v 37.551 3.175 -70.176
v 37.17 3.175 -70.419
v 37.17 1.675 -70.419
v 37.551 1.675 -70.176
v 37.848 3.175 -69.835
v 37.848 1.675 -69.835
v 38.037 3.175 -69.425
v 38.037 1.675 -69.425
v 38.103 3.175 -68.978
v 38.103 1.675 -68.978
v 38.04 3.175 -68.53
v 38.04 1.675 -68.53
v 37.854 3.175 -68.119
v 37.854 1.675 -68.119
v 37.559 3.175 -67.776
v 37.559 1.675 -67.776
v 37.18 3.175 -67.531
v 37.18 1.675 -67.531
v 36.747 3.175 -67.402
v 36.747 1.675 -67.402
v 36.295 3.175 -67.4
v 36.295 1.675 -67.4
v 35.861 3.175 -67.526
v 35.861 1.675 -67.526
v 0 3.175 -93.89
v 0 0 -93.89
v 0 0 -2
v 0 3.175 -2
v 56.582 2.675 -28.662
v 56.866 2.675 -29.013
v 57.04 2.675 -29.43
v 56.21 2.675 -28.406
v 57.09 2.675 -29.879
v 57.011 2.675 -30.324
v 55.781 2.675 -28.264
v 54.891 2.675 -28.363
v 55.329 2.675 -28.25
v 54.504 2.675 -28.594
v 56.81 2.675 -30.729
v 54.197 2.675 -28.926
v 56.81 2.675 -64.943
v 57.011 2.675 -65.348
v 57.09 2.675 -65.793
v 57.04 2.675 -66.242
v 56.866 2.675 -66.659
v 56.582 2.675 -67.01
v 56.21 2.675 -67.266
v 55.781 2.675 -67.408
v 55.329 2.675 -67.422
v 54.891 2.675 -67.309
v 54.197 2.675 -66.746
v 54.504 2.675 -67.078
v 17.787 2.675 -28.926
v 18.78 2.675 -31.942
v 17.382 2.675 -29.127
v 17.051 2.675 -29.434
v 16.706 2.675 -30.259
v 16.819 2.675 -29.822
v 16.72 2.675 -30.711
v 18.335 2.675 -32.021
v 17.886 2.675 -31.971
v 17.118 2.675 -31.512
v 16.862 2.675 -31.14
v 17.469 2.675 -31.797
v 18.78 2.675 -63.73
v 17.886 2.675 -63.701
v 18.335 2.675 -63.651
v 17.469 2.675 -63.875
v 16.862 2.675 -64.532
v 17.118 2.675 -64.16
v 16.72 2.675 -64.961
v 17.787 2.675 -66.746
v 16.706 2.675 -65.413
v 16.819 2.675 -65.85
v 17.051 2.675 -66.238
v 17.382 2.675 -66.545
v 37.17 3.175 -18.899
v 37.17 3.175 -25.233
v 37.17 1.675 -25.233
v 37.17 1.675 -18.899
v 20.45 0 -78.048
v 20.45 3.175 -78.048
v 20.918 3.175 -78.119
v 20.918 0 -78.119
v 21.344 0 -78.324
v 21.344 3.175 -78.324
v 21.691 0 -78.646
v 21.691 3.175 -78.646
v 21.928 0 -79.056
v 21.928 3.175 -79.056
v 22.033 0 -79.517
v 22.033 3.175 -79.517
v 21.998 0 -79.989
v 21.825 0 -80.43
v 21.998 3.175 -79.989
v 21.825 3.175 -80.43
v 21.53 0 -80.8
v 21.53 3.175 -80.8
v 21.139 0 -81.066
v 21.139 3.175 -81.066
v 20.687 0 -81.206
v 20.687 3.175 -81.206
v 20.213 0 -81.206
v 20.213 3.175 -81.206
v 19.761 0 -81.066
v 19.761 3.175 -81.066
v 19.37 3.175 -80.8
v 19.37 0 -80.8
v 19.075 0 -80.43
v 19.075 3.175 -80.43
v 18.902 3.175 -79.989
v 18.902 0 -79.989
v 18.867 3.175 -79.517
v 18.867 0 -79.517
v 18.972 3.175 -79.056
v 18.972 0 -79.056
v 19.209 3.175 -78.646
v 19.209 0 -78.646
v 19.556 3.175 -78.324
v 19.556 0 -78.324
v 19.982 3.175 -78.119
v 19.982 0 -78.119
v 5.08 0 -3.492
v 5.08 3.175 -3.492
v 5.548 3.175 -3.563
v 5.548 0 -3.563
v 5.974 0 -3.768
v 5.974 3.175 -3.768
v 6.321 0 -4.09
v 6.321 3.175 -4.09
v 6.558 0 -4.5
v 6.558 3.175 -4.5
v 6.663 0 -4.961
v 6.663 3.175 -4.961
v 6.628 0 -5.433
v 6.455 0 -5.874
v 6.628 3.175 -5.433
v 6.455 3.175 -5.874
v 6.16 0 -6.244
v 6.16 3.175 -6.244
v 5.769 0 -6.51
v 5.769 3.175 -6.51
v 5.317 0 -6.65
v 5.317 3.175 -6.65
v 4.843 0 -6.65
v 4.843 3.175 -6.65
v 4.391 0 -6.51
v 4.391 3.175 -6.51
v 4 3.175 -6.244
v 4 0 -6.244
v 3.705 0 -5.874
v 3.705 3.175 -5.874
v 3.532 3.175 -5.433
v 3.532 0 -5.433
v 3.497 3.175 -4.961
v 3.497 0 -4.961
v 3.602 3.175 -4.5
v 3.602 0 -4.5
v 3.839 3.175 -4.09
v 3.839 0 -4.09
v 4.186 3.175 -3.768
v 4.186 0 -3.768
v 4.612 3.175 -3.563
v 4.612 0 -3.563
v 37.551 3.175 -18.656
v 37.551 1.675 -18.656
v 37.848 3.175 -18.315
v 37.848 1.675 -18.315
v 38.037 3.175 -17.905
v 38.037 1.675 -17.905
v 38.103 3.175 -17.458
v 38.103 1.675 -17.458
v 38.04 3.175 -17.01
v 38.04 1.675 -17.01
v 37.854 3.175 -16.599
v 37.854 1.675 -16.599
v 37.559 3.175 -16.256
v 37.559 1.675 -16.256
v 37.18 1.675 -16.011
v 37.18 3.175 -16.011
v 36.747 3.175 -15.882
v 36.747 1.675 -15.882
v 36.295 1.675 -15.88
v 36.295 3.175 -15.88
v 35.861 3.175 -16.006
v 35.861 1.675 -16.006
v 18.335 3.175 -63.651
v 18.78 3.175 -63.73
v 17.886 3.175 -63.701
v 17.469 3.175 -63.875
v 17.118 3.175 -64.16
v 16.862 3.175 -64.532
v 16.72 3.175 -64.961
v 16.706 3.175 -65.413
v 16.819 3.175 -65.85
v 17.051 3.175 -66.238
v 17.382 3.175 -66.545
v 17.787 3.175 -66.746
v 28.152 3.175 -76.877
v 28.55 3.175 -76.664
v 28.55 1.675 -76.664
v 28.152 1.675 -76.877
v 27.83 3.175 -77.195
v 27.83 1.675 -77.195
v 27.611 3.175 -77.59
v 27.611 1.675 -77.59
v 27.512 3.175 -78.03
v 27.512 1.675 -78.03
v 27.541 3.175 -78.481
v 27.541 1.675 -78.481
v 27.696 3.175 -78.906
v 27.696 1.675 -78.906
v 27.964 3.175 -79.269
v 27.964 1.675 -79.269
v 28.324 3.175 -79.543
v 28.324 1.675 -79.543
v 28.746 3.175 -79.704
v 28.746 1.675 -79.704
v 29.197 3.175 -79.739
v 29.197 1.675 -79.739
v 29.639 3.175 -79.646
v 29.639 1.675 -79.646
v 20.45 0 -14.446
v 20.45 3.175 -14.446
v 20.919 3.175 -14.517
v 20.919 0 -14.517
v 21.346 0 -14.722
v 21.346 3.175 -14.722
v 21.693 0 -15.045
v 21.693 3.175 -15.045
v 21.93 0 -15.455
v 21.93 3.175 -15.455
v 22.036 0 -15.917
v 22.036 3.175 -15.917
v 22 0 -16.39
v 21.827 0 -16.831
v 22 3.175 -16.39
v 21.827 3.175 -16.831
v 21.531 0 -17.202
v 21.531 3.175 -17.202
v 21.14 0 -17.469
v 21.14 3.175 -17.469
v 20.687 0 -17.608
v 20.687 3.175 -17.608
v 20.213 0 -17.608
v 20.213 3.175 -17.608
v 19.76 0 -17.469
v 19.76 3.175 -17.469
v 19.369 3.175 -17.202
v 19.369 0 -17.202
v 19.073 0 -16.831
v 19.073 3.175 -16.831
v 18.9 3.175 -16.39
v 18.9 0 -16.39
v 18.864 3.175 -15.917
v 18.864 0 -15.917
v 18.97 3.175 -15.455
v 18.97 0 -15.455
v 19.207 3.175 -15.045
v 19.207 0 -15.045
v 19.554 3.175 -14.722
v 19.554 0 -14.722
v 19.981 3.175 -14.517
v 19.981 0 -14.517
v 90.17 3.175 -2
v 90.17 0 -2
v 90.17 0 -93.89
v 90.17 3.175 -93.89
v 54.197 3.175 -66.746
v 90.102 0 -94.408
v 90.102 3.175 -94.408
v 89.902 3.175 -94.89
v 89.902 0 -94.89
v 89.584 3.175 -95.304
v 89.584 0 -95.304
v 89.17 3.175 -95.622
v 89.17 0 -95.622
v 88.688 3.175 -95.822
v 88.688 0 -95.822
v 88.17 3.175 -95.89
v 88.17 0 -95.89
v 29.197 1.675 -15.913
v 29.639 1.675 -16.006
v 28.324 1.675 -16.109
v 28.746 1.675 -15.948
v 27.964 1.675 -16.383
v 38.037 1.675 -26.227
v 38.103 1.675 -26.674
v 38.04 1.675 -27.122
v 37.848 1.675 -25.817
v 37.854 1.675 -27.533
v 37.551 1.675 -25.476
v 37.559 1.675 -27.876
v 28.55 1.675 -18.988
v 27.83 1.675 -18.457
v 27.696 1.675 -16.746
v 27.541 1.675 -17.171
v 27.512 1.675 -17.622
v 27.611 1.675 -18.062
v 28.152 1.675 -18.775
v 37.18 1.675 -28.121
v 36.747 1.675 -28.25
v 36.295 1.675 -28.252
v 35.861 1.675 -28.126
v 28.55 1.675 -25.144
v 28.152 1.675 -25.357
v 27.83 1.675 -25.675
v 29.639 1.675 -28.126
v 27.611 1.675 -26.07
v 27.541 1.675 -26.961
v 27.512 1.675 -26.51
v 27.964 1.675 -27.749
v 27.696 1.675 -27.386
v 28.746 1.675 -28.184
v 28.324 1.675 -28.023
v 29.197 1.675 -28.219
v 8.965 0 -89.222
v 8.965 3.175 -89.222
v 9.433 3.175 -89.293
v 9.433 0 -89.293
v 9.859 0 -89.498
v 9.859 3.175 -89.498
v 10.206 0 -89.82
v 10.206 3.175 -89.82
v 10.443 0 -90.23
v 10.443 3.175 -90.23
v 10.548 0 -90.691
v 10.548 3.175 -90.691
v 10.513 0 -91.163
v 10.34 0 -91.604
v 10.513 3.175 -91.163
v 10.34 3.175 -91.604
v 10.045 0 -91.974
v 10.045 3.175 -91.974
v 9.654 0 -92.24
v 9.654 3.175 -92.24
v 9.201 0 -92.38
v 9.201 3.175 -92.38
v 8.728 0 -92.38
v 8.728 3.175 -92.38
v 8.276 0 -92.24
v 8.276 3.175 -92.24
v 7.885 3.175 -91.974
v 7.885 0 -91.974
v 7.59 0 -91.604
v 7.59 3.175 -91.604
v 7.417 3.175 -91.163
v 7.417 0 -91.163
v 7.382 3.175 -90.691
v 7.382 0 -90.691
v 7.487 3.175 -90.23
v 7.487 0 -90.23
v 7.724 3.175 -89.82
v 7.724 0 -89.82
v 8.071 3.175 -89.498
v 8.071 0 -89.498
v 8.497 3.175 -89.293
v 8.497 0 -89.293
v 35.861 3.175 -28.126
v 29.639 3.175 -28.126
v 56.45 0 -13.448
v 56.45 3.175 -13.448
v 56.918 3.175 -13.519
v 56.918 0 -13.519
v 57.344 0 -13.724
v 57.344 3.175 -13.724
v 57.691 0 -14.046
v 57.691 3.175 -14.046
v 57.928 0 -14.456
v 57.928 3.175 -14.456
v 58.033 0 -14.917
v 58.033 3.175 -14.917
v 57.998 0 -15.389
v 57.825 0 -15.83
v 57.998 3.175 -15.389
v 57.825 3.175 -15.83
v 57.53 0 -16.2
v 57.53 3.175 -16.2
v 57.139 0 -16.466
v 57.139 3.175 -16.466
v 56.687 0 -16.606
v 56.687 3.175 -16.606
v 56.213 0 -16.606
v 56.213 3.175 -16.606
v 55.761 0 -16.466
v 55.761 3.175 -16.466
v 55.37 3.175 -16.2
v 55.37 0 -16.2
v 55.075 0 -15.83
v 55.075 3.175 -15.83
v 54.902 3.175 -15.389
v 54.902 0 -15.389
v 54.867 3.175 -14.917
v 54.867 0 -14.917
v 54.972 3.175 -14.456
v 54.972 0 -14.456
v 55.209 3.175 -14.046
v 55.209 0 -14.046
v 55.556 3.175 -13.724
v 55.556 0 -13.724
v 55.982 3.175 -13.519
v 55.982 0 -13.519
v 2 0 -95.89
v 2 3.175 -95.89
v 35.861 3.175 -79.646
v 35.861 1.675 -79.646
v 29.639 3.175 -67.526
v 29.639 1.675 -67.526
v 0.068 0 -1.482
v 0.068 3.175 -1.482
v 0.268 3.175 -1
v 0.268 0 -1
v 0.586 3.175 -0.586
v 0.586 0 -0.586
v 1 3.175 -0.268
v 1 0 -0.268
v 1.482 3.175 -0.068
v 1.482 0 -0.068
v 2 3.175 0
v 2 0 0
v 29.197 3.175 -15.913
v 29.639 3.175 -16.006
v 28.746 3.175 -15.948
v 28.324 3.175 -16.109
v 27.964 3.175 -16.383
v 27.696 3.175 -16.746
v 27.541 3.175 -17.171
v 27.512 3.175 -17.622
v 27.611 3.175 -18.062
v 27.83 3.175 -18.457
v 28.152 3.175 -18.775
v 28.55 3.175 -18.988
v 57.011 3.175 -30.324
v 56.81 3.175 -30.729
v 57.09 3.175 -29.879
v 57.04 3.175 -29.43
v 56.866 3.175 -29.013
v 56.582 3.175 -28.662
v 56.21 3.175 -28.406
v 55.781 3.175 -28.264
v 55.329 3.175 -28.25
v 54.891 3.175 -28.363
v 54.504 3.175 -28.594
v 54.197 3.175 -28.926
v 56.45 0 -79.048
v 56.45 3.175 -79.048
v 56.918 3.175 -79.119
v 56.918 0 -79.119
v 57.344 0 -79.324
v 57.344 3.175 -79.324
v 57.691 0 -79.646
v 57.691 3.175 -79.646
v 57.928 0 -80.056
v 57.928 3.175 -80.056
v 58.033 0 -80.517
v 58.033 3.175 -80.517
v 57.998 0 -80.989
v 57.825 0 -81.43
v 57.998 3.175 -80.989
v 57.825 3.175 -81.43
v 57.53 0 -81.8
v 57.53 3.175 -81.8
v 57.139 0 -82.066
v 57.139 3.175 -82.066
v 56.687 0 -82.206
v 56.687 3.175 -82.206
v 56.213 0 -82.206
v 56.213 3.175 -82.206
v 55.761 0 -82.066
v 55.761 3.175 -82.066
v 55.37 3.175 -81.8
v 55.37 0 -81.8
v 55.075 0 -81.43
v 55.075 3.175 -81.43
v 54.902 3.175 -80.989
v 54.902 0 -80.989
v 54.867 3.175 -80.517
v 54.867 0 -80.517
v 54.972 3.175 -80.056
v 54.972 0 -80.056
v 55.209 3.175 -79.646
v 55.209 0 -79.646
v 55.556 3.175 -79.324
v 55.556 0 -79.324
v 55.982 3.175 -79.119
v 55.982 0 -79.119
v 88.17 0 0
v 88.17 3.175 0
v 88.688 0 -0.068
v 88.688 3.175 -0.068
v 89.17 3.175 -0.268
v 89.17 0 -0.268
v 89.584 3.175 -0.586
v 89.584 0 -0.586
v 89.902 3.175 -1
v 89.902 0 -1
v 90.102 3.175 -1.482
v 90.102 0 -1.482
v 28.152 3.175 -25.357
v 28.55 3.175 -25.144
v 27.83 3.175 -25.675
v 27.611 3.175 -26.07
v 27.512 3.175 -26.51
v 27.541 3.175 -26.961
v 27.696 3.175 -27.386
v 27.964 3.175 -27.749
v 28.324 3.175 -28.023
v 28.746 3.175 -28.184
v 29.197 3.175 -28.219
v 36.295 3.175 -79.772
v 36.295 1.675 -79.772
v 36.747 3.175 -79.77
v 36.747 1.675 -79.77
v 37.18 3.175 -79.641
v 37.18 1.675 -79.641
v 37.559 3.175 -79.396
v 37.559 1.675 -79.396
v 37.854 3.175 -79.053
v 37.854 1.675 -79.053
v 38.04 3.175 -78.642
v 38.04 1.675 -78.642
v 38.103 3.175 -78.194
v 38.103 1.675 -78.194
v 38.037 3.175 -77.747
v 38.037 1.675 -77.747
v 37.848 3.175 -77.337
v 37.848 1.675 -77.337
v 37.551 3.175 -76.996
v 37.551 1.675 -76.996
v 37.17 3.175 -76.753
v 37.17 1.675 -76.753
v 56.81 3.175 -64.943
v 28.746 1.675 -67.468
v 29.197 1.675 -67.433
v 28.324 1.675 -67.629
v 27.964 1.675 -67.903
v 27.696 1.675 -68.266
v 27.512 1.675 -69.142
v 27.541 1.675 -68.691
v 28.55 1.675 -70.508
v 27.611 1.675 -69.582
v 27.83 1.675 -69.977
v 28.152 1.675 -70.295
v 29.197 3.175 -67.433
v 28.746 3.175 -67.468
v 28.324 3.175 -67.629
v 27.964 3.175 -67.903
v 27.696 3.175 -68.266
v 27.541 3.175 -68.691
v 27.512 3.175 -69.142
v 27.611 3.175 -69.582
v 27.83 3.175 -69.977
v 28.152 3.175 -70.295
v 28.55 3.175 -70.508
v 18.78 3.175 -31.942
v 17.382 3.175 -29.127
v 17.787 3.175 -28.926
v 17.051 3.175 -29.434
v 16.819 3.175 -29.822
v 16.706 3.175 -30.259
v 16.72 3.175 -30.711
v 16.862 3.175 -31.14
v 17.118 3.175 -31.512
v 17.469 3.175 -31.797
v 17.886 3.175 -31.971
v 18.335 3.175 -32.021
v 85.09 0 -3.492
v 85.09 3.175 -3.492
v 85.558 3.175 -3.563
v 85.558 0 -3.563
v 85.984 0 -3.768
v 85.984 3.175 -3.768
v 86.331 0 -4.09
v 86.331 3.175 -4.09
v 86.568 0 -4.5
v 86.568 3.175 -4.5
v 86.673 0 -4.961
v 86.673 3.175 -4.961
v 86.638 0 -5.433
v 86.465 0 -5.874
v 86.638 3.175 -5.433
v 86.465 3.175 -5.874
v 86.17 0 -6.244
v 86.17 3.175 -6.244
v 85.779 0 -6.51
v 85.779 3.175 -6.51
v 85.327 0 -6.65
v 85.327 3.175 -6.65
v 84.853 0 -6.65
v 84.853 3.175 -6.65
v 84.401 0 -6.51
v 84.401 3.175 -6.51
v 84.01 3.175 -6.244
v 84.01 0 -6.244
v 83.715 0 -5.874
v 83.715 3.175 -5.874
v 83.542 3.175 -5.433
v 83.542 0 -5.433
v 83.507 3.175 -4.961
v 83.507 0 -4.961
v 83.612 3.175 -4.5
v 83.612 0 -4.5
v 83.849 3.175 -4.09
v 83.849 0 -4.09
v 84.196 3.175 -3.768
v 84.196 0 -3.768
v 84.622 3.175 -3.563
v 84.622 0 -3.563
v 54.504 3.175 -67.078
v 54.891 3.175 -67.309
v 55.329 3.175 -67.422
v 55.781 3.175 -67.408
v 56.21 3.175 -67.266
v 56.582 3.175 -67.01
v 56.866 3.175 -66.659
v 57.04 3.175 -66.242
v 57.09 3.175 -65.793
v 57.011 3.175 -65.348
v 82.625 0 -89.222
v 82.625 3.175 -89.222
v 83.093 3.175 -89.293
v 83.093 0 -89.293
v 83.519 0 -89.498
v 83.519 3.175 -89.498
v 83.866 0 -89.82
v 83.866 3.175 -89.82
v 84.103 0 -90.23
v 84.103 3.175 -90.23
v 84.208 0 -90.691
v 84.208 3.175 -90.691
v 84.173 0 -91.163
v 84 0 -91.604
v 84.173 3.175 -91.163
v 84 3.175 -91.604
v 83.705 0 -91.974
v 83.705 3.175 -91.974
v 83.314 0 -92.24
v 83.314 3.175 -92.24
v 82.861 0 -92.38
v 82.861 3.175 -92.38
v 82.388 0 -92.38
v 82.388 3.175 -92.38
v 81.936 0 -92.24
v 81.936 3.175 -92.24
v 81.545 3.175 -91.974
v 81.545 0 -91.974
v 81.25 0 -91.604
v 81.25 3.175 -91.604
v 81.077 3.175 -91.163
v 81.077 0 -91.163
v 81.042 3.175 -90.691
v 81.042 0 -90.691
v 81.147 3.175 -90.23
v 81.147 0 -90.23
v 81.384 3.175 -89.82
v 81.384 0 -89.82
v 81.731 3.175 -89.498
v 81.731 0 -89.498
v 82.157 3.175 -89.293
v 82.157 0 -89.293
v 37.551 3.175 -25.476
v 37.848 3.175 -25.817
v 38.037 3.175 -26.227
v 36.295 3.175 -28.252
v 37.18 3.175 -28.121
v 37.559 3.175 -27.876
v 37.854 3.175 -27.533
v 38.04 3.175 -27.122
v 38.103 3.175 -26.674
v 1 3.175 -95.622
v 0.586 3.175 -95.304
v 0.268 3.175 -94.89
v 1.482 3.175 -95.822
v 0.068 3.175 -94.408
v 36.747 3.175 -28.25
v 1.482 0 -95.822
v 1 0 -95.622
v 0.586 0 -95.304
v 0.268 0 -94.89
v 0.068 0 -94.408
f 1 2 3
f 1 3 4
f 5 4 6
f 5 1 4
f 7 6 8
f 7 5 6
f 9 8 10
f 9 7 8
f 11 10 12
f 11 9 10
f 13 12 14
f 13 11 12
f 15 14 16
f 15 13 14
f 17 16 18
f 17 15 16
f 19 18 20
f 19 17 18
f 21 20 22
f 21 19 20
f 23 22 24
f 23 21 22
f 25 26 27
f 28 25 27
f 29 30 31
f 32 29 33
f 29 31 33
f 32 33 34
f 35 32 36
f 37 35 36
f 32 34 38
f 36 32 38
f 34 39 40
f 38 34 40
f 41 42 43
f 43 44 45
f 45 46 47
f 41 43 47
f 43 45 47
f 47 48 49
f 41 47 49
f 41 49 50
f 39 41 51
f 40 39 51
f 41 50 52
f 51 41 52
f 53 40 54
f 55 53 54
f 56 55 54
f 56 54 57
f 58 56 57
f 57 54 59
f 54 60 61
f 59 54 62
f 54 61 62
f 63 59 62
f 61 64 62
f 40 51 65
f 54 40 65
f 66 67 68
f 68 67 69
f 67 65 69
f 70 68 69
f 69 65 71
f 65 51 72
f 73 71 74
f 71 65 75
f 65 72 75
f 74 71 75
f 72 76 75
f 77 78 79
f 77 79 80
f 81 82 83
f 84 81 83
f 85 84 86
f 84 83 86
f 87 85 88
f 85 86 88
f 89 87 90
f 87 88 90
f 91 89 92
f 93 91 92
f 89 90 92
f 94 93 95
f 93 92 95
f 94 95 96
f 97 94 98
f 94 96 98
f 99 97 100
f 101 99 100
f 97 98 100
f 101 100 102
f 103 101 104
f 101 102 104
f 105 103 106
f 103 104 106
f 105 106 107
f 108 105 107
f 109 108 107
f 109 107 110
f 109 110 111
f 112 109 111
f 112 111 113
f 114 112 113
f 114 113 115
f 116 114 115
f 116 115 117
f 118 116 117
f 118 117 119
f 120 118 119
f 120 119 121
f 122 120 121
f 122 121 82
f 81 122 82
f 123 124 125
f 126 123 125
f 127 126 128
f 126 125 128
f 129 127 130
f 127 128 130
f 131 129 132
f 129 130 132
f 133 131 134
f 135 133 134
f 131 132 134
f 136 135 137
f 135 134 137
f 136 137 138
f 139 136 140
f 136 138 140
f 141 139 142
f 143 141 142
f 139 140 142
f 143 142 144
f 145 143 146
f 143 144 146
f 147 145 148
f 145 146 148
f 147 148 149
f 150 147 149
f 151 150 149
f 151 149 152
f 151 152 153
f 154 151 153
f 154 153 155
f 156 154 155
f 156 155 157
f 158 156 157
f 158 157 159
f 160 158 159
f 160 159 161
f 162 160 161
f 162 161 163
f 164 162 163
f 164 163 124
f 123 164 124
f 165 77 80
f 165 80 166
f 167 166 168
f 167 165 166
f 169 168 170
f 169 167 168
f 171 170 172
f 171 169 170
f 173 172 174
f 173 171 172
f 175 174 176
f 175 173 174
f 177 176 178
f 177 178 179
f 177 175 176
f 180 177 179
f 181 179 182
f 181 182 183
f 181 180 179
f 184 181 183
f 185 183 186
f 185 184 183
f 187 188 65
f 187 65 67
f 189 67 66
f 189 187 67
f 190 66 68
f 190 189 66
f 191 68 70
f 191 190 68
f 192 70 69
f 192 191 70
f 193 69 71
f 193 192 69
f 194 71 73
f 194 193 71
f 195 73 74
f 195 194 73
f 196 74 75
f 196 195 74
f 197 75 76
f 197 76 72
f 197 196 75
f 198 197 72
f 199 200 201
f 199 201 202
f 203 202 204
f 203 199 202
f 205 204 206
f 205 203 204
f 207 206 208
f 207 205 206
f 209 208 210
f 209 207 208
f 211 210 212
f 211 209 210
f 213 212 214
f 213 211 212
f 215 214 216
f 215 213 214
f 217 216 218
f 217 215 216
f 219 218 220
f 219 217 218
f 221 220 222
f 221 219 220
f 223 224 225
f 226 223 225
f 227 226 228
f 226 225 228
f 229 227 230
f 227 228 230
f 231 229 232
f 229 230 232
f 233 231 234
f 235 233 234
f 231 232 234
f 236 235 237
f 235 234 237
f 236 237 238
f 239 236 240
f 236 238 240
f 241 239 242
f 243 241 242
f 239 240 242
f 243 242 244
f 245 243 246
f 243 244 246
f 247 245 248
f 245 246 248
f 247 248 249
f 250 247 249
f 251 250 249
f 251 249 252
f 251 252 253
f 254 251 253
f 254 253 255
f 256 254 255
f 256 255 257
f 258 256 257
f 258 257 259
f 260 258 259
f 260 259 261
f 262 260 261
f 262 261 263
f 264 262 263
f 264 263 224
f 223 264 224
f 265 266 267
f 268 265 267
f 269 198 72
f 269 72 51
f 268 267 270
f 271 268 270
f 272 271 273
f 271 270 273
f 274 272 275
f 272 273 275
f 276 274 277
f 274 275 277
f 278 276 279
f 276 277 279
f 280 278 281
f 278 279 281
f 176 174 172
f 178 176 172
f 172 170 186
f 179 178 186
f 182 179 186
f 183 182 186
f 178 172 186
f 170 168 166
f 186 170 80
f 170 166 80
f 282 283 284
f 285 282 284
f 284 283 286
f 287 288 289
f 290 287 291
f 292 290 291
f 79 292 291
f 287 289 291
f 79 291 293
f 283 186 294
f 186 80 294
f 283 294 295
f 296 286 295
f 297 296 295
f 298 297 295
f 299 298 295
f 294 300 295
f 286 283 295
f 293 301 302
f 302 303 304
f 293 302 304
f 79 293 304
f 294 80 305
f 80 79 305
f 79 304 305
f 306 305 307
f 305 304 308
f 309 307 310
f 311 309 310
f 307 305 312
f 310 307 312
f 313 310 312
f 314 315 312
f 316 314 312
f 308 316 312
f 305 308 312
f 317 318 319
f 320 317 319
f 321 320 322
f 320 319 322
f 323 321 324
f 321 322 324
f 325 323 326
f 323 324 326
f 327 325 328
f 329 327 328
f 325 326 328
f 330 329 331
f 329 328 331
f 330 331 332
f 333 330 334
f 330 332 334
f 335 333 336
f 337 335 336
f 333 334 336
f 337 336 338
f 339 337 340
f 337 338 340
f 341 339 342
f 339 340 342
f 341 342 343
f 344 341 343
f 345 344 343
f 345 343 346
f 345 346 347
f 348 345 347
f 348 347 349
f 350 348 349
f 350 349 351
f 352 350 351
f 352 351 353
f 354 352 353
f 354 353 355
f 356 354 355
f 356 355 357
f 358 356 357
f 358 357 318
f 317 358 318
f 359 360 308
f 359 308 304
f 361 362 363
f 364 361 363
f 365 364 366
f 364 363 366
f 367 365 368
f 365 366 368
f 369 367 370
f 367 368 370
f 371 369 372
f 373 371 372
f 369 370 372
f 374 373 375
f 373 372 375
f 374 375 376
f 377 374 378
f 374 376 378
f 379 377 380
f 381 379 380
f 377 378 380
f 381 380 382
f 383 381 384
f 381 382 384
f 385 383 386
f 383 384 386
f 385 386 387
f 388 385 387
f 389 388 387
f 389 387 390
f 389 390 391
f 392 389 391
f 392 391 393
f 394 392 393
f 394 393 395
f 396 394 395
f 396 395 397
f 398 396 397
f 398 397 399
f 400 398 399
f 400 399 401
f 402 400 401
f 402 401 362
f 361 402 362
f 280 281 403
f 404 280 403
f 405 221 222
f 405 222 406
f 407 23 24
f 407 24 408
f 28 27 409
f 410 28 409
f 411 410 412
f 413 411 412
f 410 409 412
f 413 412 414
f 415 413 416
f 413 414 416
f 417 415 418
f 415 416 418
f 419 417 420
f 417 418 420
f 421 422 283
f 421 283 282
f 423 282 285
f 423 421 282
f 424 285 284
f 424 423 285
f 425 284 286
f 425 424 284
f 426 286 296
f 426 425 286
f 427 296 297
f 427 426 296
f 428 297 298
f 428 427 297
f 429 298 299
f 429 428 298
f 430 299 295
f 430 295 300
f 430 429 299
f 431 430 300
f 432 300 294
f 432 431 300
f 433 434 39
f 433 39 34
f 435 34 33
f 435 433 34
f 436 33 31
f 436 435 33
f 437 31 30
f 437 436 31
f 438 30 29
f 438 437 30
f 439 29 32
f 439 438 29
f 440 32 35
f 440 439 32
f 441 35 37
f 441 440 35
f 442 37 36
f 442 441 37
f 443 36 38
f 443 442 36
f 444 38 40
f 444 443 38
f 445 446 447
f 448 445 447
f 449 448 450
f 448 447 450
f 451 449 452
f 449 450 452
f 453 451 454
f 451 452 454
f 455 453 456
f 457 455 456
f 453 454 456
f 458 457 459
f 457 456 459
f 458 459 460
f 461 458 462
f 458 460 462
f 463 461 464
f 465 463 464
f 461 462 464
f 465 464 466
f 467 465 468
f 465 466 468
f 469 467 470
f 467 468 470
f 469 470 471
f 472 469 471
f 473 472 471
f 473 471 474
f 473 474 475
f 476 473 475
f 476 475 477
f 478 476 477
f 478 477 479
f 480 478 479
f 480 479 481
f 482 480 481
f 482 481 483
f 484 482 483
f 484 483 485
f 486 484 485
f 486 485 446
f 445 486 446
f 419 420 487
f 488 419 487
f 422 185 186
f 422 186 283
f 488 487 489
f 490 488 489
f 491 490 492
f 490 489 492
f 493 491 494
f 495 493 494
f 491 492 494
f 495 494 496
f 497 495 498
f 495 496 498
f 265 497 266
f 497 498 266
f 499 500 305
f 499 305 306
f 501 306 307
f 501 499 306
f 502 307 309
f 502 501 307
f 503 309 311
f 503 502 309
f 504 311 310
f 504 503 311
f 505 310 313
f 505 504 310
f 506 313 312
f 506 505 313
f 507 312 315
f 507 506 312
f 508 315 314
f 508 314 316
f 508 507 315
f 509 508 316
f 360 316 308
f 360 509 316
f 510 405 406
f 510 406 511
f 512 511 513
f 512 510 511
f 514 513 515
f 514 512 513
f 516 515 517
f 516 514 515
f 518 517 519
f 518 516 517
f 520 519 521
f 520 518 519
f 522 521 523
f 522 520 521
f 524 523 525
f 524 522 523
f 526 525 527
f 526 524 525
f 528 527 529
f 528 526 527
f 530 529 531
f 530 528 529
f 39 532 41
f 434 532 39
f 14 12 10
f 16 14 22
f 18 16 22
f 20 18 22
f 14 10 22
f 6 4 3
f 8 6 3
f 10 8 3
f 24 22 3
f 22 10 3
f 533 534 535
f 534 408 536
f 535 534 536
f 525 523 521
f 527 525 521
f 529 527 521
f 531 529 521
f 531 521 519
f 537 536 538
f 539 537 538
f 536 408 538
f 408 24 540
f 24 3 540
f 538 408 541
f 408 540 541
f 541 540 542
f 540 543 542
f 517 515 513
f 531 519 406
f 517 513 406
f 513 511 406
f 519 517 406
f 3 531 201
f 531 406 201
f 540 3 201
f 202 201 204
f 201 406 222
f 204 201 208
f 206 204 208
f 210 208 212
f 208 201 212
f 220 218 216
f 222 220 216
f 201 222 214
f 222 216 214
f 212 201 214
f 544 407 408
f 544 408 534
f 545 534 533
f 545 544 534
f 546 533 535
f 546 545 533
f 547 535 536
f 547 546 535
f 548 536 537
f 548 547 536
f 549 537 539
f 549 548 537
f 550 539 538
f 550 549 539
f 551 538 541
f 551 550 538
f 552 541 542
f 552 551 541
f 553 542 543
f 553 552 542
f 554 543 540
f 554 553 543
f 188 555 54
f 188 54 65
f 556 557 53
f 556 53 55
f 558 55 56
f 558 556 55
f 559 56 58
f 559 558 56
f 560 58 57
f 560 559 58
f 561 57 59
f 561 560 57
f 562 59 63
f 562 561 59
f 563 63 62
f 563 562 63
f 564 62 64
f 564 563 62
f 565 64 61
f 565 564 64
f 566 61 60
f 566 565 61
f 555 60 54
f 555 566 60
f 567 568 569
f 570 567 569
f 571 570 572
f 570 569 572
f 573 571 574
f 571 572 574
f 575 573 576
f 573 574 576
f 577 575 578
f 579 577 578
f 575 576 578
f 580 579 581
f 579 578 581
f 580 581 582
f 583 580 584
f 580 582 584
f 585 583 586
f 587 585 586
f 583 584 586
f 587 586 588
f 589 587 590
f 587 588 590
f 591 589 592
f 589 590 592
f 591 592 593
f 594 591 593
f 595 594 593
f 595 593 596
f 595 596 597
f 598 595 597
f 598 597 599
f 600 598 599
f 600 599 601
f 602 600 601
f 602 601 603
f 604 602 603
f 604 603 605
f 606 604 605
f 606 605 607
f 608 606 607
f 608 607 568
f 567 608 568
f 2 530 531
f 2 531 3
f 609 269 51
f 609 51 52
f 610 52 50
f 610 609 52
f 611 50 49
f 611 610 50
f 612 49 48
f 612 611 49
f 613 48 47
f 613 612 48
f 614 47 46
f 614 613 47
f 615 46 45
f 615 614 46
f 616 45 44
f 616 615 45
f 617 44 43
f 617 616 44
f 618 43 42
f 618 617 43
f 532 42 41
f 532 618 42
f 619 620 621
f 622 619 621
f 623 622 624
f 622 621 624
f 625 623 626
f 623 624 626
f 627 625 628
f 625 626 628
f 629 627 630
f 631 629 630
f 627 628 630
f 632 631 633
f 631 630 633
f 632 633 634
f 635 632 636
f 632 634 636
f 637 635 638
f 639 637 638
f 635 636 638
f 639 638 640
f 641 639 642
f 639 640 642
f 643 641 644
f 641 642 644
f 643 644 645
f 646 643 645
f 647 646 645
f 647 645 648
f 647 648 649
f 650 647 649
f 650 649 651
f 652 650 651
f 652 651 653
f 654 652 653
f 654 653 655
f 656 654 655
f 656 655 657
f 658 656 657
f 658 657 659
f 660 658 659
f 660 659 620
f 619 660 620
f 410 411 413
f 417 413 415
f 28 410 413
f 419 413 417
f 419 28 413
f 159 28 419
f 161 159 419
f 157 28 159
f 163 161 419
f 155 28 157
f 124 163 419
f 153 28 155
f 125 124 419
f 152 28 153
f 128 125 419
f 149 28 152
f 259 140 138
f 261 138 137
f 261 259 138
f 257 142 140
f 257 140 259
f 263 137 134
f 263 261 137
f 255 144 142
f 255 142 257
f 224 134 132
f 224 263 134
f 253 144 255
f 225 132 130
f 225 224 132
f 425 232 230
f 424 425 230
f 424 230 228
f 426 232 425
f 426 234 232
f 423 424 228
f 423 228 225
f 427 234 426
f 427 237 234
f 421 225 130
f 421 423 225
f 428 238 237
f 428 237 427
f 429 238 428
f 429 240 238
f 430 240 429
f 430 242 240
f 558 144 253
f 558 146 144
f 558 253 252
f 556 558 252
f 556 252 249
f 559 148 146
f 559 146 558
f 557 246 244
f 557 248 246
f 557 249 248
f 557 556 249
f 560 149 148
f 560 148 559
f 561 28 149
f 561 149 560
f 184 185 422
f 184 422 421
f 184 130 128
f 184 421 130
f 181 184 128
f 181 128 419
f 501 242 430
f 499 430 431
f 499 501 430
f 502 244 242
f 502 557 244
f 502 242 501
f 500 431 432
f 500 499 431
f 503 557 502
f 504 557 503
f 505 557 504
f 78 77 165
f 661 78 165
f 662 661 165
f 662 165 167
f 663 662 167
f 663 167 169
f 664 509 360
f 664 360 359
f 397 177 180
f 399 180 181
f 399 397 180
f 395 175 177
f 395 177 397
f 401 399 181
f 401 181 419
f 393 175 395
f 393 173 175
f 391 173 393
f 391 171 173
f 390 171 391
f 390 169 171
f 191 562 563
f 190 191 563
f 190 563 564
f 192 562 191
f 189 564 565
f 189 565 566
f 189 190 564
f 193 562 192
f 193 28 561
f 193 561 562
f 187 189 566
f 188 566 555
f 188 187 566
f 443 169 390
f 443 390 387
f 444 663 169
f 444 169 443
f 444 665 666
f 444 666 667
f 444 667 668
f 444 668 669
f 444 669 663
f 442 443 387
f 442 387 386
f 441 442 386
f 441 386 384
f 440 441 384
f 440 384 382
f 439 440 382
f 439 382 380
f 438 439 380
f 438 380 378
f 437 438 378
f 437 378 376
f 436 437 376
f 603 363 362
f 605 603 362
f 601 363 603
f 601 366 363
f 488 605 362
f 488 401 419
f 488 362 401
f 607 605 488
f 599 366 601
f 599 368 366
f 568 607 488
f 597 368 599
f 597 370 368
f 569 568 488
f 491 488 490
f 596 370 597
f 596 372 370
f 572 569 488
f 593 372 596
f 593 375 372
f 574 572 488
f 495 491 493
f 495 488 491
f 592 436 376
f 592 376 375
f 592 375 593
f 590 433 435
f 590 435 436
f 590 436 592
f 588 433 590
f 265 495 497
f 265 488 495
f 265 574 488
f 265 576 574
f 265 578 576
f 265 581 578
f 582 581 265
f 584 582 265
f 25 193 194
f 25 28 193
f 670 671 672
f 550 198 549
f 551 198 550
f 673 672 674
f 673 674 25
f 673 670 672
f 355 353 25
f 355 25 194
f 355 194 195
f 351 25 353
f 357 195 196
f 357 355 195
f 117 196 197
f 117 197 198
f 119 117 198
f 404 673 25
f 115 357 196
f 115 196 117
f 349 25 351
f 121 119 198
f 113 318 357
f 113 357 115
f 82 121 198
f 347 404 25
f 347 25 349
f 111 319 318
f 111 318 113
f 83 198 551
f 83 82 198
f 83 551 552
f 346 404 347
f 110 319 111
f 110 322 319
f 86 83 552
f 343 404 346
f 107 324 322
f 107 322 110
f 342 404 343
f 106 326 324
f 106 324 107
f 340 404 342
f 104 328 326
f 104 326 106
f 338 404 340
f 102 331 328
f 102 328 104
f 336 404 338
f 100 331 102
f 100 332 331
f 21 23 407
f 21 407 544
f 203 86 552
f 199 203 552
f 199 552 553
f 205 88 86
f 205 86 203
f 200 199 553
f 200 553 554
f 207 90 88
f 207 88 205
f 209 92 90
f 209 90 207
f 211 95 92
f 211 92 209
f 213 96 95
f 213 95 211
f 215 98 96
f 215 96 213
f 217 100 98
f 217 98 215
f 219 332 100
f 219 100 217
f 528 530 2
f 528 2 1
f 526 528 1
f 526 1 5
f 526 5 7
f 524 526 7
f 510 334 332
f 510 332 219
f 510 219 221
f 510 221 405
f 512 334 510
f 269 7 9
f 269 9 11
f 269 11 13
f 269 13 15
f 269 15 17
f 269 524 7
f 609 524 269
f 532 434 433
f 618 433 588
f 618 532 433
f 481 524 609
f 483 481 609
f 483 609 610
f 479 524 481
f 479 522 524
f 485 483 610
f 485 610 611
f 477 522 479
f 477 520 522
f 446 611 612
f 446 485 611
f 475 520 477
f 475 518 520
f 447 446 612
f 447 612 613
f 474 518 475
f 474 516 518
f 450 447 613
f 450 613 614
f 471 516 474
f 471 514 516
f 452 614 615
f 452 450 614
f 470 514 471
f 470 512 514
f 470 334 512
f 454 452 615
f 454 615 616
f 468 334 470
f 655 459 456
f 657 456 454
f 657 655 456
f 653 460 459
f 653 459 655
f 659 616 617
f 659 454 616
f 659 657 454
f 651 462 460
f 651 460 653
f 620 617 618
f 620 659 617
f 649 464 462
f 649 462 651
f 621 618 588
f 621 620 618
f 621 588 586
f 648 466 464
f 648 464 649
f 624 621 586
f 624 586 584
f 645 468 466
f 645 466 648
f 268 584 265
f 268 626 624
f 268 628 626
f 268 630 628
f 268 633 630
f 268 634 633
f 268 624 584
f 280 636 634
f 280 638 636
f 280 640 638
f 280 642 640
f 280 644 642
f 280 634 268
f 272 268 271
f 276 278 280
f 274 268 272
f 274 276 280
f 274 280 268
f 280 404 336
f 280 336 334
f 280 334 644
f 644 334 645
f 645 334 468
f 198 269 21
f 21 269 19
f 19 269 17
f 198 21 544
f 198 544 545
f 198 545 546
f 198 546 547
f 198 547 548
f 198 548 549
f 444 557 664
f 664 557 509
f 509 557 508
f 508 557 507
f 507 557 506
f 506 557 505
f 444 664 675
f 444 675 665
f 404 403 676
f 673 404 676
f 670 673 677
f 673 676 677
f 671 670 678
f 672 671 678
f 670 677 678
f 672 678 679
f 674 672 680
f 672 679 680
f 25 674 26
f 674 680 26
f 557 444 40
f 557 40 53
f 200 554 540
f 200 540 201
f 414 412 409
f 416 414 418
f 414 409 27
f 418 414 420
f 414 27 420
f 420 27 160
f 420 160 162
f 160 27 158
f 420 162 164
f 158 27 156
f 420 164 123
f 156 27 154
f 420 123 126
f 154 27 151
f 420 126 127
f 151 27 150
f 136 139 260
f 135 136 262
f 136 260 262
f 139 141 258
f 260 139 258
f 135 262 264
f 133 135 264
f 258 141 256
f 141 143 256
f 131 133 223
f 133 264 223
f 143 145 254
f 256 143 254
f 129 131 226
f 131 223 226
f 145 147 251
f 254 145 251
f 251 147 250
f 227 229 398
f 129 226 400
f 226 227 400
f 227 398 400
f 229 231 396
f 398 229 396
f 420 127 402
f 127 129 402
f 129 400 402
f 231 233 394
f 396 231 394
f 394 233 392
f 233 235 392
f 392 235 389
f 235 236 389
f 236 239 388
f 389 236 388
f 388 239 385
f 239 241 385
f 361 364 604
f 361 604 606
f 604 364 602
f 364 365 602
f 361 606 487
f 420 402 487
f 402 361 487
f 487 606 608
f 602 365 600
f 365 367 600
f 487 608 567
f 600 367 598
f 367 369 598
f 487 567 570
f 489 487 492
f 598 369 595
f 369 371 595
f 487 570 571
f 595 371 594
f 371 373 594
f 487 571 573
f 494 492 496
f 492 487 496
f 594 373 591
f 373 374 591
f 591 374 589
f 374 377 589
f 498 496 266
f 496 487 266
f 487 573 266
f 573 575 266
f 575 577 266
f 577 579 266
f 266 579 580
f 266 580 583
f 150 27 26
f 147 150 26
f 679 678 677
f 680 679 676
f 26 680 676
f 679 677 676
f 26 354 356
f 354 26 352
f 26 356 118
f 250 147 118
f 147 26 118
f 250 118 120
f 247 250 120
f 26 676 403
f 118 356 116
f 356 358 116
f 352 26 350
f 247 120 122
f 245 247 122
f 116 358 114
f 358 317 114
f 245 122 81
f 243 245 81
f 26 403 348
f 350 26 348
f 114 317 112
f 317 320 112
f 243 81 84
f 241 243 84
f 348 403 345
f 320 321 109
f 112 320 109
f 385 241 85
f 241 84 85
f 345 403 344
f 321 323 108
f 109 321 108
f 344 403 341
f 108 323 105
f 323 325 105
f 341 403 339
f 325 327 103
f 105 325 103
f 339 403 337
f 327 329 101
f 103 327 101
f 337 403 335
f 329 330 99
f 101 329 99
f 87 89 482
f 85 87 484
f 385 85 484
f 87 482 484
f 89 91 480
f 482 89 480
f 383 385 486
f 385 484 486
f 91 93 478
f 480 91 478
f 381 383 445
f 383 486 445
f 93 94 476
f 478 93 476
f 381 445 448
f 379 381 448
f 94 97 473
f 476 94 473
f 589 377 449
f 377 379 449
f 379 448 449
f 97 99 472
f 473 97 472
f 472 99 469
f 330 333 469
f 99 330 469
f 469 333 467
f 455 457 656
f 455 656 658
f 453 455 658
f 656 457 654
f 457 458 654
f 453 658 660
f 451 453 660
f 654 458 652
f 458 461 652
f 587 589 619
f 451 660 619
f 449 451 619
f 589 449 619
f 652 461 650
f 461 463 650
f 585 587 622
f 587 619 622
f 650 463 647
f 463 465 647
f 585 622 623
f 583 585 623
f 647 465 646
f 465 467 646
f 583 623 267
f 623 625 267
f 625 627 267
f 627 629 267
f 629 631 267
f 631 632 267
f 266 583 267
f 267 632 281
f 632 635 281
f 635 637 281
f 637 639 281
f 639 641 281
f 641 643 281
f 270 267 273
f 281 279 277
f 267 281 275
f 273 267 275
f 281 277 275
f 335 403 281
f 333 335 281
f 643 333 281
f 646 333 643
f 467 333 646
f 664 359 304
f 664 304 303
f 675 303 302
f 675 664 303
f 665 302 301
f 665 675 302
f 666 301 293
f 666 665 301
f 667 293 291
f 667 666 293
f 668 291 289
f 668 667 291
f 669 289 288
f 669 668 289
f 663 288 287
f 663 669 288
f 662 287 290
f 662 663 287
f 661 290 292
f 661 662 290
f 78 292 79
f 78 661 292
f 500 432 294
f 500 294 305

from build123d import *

# Parameters (mm, degrees)
BOSS_EXTRUDE1_DEPTH = 3.175
SKETCH2_R           = 1.5875
SKETCH2_R_2         = 1.59
CUT_EXTRUDE1_DEPTH  = 132.664731895
CUT_EXTRUDE2_DEPTH  = 0.5
CUT_EXTRUDE3_DEPTH  = 1.5


with BuildPart() as part:
    # Sketch1 → Boss-Extrude1 (new body)
    with BuildSketch(Plane(origin=(0, 0, 0), x_dir=(1, 0, 0), z_dir=(0, 1, 0))):
        with BuildLine():
            Line((2, 0), (88.17, 0))
            ThreePointArc((88.17, 0), (89.584213562, 0.585786438), (90.17, 2))
            Line((90.17, 2), (90.17, 93.89))
            ThreePointArc((90.17, 93.89), (89.584213562, 95.304213562), (88.17, 95.89))
            Line((88.17, 95.89), (2, 95.89))
            ThreePointArc((2, 95.89), (0.585786438, 95.304213562), (0, 93.89))
            Line((0, 93.89), (0, 2))
            ThreePointArc((0, 2), (0.585786438, 0.585786438), (2, 0))
        make_face()
    extrude(amount=BOSS_EXTRUDE1_DEPTH)

    # Sketch2 → Cut-Extrude1 (cut, through all)
    with BuildSketch(Plane(origin=(0, 3.175, 0), x_dir=(1, 0, 0), z_dir=(0, 1, 0))):
        with Locations(Location((5.08, 5.08, 0), (0, 0, 270))):
            Circle(SKETCH2_R)
        with Locations(Location((8.96488723, 90.81, 0), (0, 0, 270))):
            Circle(SKETCH2_R)
        with Locations(Location((85.09, 5.08, 0), (0, 0, 270))):
            Circle(SKETCH2_R)
        with Locations(Location((82.62488723, 90.81, 0), (0, 0, 270))):
            Circle(SKETCH2_R)
        with Locations(Location((20.45, 16.036, 0), (0, 0, 270))):
            Circle(SKETCH2_R_2)
        with Locations(Location((20.45, 79.636, 0), (0, 0, 270))):
            Circle(SKETCH2_R)
        with Locations(Location((56.45, 80.636, 0), (0, 0, 270))):
            Circle(SKETCH2_R)
        with Locations(Location((56.45, 15.036, 0), (0, 0, 270))):
            Circle(SKETCH2_R)
    extrude(amount=-CUT_EXTRUDE1_DEPTH, mode=Mode.SUBTRACT)

    # Sketch3 → Cut-Extrude2 (cut)
    with BuildSketch(Plane(origin=(0, 3.175, 0), x_dir=(1, 0, 0), z_dir=(0, 1, 0))):
        with BuildLine():
            Line((17.786991297, 66.746), (54.196641075, 66.746))
            ThreePointArc((54.196641075, 66.746), (56.404844266, 67.151155734), (56.81, 64.942952544))
            Line((56.81, 64.942952544), (56.81, 30.729047456))
            ThreePointArc((56.81, 30.729047456), (56.404844266, 28.520844266), (54.196641075, 28.926))
            Line((54.196641075, 28.926), (17.786991297, 28.926))
            ThreePointArc((17.786991297, 28.926), (16.775636345, 30.930363655), (18.78, 31.941718607))
            Line((18.78, 31.941718607), (18.78, 63.730281393))
            ThreePointArc((18.78, 63.730281393), (16.775636345, 64.741636345), (17.786991297, 66.746))
        make_face()
    extrude(amount=-CUT_EXTRUDE2_DEPTH, mode=Mode.SUBTRACT)

    # Sketch4 → Cut-Extrude3 (cut)
    with BuildSketch(Plane(origin=(0, 3.175, 0), x_dir=(1, 0, 0), z_dir=(0, 1, 0))):
        with BuildLine():
            Line((29.63877923, 28.126), (35.86122077, 28.126))
            ThreePointArc((35.86122077, 28.126), (37.961961131, 27.334038869), (37.17, 25.233298507))
            Line((37.17, 25.233298507), (37.17, 18.898701493))
            ThreePointArc((37.17, 18.898701493), (37.961961131, 16.797961131), (35.86122077, 16.006))
            Line((35.86122077, 16.006), (29.63877923, 16.006))
            ThreePointArc((29.63877923, 16.006), (27.603149796, 16.952850204), (28.55, 18.988479638))
            Line((28.55, 18.988479638), (28.55, 25.143520362))
            ThreePointArc((28.55, 25.143520362), (27.603149796, 27.179149796), (29.63877923, 28.126))
        make_face()
        with BuildLine():
            Line((37.17, 76.753298507), (37.17, 70.418701493))
            ThreePointArc((37.17, 70.418701493), (37.961961131, 68.317961131), (35.86122077, 67.526))
            Line((35.86122077, 67.526), (29.63877923, 67.526))
            ThreePointArc((29.63877923, 67.526), (27.603149796, 68.472850204), (28.55, 70.508479638))
            Line((28.55, 70.508479638), (28.55, 76.663520362))
            ThreePointArc((28.55, 76.663520362), (27.603149796, 78.699149796), (29.63877923, 79.646))
            Line((29.63877923, 79.646), (35.86122077, 79.646))
            ThreePointArc((35.86122077, 79.646), (37.961961131, 78.854038869), (37.17, 76.753298507))
        make_face()
    extrude(amount=-CUT_EXTRUDE3_DEPTH, mode=Mode.SUBTRACT)


solid = part.part
